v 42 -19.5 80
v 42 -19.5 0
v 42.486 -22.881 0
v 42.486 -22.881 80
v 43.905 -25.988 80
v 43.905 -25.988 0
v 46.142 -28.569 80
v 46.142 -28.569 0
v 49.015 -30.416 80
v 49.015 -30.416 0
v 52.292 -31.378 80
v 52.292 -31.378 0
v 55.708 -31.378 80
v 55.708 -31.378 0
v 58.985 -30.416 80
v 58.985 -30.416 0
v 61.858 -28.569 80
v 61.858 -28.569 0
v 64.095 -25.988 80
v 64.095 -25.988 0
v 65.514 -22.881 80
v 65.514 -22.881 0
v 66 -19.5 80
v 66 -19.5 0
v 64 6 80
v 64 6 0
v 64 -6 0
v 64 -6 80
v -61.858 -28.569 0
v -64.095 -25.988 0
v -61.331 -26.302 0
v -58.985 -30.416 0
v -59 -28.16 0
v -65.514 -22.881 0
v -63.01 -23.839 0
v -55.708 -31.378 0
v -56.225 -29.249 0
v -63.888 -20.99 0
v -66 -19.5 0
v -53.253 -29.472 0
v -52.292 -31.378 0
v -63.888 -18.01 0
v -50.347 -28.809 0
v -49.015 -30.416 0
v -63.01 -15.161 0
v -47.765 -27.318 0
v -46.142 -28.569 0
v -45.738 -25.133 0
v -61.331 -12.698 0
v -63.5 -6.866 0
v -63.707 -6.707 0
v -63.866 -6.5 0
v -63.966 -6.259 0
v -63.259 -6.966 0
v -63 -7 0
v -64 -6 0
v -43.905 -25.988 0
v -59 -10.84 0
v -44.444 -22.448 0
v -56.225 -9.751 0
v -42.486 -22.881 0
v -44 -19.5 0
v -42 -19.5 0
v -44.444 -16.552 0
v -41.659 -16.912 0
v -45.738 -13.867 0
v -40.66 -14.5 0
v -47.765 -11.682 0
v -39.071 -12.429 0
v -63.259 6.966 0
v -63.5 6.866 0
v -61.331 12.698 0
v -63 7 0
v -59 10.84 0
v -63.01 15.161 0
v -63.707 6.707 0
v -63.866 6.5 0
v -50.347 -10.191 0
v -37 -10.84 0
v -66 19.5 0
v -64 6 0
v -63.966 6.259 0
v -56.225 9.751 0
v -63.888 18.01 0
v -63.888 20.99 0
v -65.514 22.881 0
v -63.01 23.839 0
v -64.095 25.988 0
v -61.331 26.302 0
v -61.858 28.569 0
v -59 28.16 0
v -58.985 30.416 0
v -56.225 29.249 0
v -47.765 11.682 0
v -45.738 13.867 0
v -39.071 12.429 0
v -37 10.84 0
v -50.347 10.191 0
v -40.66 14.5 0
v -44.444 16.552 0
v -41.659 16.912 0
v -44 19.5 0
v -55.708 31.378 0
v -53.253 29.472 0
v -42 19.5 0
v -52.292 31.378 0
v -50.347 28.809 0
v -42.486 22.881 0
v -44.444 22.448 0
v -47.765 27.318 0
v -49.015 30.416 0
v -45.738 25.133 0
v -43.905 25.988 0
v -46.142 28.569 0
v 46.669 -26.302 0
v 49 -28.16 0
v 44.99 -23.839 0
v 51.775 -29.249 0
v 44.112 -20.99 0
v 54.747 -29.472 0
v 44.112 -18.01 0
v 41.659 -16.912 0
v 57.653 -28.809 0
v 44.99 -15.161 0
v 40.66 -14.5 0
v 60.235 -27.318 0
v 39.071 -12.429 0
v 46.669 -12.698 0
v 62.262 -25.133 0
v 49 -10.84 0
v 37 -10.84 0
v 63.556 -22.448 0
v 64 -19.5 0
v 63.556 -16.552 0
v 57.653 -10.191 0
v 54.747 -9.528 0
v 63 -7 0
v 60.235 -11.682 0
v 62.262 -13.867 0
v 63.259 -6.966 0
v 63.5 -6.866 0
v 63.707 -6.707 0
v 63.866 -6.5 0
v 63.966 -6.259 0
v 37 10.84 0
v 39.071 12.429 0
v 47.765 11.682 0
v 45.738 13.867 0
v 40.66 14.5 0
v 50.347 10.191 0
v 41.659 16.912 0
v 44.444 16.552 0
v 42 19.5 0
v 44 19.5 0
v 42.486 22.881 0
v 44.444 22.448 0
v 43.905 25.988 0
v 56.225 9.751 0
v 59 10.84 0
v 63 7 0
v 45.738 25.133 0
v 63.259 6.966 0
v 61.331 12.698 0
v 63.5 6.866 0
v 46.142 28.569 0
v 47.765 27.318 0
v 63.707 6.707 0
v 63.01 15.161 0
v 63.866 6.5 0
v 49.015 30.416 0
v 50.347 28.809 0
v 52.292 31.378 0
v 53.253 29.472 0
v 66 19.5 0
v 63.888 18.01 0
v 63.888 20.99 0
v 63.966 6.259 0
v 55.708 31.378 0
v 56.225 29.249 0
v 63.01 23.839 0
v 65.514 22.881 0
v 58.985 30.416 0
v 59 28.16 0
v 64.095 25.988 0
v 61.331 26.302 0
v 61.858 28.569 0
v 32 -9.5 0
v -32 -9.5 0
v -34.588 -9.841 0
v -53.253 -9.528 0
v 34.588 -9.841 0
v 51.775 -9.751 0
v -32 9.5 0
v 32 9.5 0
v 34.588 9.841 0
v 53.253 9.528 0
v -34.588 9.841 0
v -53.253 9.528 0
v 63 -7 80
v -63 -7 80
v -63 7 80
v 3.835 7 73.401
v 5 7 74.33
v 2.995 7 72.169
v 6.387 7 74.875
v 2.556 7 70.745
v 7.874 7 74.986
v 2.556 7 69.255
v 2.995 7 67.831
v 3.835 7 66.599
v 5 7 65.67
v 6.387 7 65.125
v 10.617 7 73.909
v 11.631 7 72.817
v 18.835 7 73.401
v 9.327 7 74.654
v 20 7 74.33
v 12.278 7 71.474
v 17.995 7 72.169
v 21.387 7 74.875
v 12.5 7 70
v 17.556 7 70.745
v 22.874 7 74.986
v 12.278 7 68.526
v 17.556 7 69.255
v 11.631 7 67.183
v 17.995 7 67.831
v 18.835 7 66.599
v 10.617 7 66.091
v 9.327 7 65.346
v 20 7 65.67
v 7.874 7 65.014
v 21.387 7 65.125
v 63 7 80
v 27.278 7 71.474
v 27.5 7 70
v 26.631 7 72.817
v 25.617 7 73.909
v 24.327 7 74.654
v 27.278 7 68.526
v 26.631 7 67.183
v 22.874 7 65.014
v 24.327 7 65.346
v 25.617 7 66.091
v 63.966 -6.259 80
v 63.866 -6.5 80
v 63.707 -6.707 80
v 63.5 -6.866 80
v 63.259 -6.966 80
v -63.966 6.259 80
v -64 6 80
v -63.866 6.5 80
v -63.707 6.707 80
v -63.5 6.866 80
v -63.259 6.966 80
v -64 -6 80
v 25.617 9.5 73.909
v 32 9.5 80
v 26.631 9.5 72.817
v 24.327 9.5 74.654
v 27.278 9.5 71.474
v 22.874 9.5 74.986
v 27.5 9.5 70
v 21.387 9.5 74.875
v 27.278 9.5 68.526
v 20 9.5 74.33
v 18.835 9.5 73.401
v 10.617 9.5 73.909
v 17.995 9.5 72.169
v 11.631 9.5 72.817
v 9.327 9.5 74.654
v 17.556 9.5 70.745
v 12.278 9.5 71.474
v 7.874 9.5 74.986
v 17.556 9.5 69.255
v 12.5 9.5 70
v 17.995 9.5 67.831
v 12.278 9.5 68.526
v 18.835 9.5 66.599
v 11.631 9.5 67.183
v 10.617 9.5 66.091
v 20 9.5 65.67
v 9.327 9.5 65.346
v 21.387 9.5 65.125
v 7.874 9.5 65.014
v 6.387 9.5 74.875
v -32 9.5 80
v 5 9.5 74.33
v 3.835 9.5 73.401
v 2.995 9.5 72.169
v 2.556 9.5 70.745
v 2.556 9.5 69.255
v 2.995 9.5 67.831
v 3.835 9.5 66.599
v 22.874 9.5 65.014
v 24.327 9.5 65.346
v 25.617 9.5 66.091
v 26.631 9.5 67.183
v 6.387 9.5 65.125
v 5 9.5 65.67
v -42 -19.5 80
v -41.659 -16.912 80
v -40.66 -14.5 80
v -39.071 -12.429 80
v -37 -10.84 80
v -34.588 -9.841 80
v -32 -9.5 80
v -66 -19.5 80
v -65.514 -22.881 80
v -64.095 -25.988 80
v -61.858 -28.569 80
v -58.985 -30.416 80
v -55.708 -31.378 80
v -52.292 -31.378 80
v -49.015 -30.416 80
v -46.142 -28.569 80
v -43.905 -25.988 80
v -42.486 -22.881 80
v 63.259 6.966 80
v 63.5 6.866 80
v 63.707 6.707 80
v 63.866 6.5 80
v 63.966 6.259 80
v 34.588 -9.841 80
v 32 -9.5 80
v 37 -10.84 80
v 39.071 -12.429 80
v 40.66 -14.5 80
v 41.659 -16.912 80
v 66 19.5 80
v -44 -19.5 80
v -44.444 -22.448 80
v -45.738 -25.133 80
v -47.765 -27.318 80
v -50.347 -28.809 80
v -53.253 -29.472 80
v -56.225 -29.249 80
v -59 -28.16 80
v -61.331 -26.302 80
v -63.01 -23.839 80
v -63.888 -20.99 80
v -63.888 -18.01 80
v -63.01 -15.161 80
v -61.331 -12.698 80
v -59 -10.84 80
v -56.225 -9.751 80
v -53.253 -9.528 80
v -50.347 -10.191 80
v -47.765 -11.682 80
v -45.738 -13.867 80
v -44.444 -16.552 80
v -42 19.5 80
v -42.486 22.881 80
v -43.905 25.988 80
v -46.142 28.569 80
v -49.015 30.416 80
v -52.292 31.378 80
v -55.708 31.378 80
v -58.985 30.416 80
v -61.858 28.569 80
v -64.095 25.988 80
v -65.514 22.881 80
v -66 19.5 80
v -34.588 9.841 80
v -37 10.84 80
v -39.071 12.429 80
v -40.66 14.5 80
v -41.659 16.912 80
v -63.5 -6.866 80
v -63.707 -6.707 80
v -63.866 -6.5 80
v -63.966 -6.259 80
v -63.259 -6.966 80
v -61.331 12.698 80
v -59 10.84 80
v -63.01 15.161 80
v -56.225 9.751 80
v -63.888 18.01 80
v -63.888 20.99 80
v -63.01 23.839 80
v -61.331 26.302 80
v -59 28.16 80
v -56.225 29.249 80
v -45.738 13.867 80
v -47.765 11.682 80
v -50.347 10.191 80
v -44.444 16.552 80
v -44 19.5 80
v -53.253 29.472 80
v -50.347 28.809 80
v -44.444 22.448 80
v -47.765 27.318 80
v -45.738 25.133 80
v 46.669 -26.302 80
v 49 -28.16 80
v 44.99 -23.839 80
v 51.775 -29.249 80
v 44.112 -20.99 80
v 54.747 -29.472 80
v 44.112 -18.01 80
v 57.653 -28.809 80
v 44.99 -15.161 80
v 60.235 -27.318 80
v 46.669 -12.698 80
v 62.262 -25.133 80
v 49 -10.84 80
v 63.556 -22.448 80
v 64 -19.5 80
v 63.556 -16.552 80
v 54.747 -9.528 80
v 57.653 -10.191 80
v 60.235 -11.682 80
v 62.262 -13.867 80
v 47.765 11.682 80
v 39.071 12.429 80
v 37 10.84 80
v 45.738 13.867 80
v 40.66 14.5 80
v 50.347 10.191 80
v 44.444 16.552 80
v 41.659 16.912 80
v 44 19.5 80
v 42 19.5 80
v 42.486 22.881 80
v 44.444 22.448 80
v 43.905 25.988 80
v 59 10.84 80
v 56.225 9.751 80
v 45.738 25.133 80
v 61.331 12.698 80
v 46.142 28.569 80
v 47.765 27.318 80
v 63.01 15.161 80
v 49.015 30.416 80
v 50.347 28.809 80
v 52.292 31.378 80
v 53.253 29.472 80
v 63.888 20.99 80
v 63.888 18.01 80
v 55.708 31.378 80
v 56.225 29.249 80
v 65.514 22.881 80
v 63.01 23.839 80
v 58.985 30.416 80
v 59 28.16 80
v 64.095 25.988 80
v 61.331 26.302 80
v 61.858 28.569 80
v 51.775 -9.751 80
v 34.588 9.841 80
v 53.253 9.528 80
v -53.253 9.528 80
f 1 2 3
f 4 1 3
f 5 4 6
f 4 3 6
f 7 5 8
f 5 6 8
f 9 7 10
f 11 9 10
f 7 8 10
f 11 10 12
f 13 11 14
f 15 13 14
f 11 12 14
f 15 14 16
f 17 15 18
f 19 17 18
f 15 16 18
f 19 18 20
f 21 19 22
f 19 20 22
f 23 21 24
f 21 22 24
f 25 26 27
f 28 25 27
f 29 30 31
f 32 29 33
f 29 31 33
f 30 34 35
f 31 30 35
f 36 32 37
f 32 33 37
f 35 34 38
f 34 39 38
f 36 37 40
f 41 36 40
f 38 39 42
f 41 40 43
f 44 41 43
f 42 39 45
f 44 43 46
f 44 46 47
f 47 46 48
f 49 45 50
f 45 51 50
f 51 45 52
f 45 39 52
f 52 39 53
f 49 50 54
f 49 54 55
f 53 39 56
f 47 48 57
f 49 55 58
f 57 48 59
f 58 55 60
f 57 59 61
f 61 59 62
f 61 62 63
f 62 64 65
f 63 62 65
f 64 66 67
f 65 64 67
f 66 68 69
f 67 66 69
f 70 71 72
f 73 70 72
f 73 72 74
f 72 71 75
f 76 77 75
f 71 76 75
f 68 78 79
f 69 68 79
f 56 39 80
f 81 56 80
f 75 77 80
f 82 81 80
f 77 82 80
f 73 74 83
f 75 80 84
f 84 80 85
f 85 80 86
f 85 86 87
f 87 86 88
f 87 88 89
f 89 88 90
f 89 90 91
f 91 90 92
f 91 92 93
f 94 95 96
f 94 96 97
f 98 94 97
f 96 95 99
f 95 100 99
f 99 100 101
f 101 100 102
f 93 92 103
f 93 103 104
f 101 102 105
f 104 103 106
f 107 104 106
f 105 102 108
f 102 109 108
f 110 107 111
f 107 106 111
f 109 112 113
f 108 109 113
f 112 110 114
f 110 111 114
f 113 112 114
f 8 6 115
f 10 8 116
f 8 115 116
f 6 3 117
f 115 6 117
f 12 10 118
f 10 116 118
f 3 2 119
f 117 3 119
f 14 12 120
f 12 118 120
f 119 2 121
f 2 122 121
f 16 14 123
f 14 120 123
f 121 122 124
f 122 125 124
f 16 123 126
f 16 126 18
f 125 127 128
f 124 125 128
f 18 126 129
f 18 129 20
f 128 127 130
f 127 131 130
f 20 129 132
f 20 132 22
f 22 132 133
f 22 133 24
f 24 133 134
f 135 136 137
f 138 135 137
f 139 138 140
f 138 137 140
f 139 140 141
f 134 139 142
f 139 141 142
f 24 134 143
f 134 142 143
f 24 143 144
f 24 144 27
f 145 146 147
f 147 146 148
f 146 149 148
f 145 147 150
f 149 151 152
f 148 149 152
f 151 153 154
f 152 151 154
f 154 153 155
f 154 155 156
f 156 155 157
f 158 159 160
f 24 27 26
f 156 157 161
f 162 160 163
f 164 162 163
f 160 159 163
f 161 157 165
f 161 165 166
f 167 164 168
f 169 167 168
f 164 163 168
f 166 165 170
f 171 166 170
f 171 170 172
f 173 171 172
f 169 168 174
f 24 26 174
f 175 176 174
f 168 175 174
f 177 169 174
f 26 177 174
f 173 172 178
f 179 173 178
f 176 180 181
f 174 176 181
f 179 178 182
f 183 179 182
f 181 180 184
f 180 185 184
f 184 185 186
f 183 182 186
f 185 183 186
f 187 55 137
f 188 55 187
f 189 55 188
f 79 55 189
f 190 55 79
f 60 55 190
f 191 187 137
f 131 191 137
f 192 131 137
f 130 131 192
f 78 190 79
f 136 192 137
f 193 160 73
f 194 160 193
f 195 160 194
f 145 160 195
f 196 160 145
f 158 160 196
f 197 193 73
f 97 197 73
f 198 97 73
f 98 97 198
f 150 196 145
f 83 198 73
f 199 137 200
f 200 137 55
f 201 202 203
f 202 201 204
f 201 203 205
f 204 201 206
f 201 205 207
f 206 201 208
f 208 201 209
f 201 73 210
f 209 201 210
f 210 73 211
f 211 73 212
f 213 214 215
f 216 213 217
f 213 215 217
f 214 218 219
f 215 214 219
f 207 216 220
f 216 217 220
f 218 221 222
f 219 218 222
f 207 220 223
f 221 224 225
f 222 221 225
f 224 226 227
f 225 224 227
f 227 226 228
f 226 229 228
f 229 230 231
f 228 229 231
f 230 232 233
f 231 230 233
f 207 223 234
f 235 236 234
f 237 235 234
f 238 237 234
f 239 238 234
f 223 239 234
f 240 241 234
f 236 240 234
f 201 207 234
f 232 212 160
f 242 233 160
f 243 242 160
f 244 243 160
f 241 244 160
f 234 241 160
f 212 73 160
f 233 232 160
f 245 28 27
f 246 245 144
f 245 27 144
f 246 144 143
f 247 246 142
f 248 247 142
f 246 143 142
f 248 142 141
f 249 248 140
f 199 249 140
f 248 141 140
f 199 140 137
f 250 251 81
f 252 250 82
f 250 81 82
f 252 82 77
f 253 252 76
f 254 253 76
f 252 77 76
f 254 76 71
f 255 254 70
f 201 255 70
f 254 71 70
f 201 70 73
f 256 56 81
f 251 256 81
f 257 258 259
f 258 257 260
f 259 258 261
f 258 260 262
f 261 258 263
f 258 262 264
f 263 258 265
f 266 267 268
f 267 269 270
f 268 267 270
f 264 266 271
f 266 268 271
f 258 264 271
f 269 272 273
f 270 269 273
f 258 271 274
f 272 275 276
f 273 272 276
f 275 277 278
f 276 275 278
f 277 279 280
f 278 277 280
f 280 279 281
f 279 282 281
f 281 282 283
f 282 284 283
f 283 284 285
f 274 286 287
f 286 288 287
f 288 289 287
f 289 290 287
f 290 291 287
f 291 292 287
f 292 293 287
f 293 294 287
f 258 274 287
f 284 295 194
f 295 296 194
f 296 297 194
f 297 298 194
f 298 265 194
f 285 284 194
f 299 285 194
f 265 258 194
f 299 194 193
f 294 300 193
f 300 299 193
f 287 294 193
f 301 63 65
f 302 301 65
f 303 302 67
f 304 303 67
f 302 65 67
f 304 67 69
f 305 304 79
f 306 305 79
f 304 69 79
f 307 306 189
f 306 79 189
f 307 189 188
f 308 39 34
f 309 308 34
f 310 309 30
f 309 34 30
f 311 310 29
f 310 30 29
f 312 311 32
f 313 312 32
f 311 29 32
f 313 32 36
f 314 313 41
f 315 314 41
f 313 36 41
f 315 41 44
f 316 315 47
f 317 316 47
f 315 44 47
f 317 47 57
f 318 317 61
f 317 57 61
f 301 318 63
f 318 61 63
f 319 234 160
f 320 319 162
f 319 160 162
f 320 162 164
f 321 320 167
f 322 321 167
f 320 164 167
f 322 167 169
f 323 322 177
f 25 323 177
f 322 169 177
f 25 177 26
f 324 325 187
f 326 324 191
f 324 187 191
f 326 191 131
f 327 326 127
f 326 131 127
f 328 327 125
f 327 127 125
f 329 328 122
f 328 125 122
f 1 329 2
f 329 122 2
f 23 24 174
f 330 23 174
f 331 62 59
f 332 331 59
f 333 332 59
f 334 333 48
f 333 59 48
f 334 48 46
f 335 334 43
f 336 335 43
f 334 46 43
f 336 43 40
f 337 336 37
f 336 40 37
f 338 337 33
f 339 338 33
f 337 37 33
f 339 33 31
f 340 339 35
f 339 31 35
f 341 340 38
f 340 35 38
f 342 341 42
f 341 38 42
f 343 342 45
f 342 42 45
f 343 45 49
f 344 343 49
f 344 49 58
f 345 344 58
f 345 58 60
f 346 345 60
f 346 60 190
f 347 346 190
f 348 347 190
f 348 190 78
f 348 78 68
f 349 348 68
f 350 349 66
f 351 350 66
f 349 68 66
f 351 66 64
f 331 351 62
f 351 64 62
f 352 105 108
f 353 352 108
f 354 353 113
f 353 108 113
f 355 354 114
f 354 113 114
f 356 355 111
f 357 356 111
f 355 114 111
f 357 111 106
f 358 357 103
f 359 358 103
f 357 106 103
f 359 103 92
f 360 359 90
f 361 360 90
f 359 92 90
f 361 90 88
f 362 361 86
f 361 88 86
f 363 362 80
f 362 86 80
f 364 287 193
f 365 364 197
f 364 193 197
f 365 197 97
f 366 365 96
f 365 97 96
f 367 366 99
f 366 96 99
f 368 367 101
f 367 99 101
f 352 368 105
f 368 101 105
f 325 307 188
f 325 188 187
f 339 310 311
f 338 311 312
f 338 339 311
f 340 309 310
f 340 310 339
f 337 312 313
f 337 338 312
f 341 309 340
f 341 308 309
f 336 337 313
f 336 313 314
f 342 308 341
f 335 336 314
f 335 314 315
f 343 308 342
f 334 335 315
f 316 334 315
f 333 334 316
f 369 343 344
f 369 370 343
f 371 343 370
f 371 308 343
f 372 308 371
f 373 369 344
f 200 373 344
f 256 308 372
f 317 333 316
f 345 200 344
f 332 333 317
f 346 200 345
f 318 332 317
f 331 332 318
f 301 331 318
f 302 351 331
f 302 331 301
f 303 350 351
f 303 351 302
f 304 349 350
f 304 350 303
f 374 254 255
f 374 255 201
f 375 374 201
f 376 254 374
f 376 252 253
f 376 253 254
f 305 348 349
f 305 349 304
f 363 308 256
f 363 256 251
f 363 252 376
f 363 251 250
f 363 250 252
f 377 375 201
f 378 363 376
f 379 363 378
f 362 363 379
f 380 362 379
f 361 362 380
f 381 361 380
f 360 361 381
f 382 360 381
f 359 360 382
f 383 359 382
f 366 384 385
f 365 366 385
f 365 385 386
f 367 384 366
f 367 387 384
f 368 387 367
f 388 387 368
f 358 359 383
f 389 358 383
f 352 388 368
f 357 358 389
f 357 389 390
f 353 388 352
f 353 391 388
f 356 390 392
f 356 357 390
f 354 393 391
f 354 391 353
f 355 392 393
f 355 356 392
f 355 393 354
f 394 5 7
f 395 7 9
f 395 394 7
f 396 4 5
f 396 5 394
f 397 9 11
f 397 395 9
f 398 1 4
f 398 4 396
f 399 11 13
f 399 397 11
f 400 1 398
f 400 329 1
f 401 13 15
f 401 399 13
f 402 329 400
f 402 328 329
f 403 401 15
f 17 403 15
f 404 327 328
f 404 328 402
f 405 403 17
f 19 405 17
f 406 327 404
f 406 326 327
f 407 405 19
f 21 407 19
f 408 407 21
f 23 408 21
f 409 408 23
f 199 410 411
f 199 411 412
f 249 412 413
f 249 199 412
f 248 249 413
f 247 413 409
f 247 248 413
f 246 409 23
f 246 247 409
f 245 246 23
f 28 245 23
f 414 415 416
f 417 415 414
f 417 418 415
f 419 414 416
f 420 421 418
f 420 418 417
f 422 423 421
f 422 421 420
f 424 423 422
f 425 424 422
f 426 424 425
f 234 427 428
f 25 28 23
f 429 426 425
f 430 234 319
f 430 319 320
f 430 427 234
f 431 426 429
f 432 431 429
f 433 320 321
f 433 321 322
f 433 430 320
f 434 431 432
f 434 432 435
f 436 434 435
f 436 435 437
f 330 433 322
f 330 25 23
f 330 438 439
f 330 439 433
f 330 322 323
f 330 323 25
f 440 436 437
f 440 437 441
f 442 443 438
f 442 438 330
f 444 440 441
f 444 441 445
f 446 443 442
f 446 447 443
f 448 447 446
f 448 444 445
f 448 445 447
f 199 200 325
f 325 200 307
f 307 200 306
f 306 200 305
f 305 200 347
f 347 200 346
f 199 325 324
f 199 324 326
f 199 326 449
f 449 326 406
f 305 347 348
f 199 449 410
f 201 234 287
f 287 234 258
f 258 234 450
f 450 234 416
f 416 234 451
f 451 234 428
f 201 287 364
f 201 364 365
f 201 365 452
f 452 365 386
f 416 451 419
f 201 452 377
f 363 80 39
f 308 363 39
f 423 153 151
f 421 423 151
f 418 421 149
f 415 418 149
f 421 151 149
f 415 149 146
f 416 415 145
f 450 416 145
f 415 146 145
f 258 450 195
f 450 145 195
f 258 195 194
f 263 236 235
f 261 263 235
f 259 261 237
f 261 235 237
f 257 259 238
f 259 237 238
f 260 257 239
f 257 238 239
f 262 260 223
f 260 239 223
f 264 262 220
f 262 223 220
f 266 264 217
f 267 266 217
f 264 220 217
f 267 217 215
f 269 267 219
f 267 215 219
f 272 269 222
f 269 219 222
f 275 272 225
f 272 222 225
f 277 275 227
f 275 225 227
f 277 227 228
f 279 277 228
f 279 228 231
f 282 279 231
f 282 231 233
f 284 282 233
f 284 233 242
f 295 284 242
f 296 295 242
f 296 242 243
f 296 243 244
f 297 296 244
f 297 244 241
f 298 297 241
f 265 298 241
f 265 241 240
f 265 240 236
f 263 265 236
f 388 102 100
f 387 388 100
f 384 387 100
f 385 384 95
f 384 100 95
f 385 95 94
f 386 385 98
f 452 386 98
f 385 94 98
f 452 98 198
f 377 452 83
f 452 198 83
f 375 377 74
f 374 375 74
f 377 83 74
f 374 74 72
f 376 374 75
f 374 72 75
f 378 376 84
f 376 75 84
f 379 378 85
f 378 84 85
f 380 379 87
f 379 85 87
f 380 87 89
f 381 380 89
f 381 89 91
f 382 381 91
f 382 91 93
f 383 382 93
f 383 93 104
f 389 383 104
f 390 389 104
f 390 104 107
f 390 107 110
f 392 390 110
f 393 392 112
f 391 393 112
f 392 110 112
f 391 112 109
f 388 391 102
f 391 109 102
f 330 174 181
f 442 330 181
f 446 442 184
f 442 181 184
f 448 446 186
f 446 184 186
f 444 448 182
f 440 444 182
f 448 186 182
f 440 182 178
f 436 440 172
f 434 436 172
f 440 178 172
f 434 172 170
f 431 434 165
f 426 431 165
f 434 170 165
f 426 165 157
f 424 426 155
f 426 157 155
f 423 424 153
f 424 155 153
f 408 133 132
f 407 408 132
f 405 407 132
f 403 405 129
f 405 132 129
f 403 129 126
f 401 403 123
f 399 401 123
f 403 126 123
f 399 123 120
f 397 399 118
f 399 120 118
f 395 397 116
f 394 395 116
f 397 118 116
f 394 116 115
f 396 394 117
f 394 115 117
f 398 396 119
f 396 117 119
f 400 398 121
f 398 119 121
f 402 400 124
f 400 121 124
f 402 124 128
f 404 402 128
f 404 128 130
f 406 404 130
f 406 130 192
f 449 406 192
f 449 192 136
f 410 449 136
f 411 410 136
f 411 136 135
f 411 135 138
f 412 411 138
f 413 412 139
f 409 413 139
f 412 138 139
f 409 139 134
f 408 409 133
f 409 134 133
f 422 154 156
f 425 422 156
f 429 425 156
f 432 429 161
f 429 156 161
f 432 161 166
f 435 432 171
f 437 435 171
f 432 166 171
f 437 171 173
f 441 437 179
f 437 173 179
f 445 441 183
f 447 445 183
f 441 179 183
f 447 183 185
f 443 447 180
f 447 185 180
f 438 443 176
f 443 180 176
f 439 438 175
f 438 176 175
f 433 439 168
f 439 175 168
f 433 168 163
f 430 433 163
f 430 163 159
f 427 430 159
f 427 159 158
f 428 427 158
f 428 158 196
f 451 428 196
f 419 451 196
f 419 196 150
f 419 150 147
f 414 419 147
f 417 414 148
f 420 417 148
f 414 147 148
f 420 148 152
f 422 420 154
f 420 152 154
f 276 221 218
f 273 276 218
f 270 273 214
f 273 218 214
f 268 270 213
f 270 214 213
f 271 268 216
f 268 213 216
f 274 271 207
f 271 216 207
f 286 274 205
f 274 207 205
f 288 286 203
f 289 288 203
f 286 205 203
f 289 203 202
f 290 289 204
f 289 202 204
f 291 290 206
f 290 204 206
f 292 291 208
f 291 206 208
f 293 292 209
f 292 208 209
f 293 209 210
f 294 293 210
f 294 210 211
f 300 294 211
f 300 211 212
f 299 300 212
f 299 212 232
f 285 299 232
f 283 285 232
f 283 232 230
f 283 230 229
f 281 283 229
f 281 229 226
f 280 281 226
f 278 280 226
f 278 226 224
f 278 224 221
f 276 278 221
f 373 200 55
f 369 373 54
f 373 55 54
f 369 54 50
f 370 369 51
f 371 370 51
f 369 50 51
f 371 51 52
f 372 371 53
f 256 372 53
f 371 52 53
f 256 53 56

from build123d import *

# Parameters (mm, degrees)
F1_DEPTH = 80
F2_R     = 5
F3_DEPTH = 25


with BuildPart() as f1:
    # F0 (on Top) → F1 (new body)
    with BuildSketch(Plane.XY):
        with BuildLine():
            Line((44, 7), (63, 7))
            ThreePointArc((63, 7), (63.707107, 6.707107), (64, 6))
            Line((64, 6), (64, -6))
            ThreePointArc((64, -6), (63.707107, -6.707107), (63, -7))
            Line((63, -7), (44, -7))
            Line((44, -7), (44, -19.5))
            ThreePointArc((44, -19.5), (54, -9.5), (64, -19.5))
            Line((64, -19.5), (64, -7))
            Line((64, -7), (66, -7))
            Line((66, -7), (66, 7))
            Line((66, 7), (64, 7))
            Line((64, 7), (64, 19.5))
            ThreePointArc((64, 19.5), (54, 9.5), (44, 19.5))
            Line((44, 19.5), (44, 7))
        make_face()
        with BuildLine():
            Line((42, 7), (44, 7))
            Line((44, 7), (44, 19.5))
            ThreePointArc((44, 19.5), (54, 29.5), (64, 19.5))
            Line((64, 19.5), (64, 7))
            Line((64, 7), (66, 7))
            Line((66, 7), (66, 19.5))
            ThreePointArc((66, 19.5), (54, 31.5), (42, 19.5))
            Line((42, 19.5), (42, 7))
        make_face()
        with BuildLine():
            Line((-42, 7), (42, 7))
            Line((42, 7), (42, 19.5))
            ThreePointArc((42, 19.5), (39.071068, 12.428932), (32, 9.5))
            Line((32, 9.5), (-32, 9.5))
            ThreePointArc((-32, 9.5), (-39.071068, 12.428932), (-42, 19.5))
            Line((-42, 19.5), (-42, 7))
        make_face()
        with BuildLine():
            Line((-44, 7), (-42, 7))
            Line((-42, 7), (-42, 19.5))
            ThreePointArc((-42, 19.5), (-54, 31.5), (-66, 19.5))
            Line((-66, 19.5), (-66, 7))
            Line((-66, 7), (-64, 7))
            Line((-64, 7), (-64, 19.5))
            ThreePointArc((-64, 19.5), (-54, 29.5), (-44, 19.5))
            Line((-44, 19.5), (-44, 7))
        make_face()
        with BuildLine():
            Line((-63, 7), (-44, 7))
            Line((-44, 7), (-44, 19.5))
            ThreePointArc((-44, 19.5), (-54, 9.5), (-64, 19.5))
            Line((-64, 19.5), (-64, 7))
            Line((-64, 7), (-66, 7))
            Line((-66, 7), (-66, -6.902831))
            Line((-66, -6.902831), (-64, -7))
            Line((-64, -7), (-64, -19.5))
            ThreePointArc((-64, -19.5), (-54, -9.5), (-44, -19.5))
            Line((-44, -19.5), (-44, -7))
            Line((-44, -7), (-63, -7))
            ThreePointArc((-63, -7), (-63.707107, -6.707107), (-64, -6))
            Line((-64, -6), (-64, 6))
            ThreePointArc((-64, 6), (-63.707107, 6.707107), (-63, 7))
        make_face()
        with BuildLine():
            Line((44, -19.5), (44, -7))
            Line((44, -7), (42, -7))
            Line((42, -7), (42, -19.5))
            ThreePointArc((42, -19.5), (54, -31.5), (66, -19.5))
            Line((66, -19.5), (66, -7))
            Line((66, -7), (64, -7))
            Line((64, -7), (64, -19.5))
            ThreePointArc((64, -19.5), (54, -29.5), (44, -19.5))
        make_face()
        with BuildLine():
            Line((42, -19.5), (42, -7))
            Line((42, -7), (-42, -7))
            Line((-42, -7), (-42, -19.5))
            ThreePointArc((-42, -19.5), (-39.071068, -12.428932), (-32, -9.5))
            Line((-32, -9.5), (32, -9.5))
            ThreePointArc((32, -9.5), (39.071068, -12.428932), (42, -19.5))
        make_face()
        with BuildLine():
            Line((-42, -19.5), (-42, -7))
            Line((-42, -7), (-44, -7))
            Line((-44, -7), (-44, -19.5))
            ThreePointArc((-44, -19.5), (-54, -29.5), (-64, -19.5))
            Line((-64, -19.5), (-64, -7))
            Line((-64, -7), (-66, -6.902831))
            Line((-66, -6.902831), (-66, -19.5))
            ThreePointArc((-66, -19.5), (-54, -31.5), (-42, -19.5))
        make_face()
    extrude(amount=F1_DEPTH)

    # F2 (on Front) → F3 (cut)
    with BuildSketch(Plane.XZ):
        with Locations((22.5, 70)):
            Circle(F2_R)
        with Locations((7.5, 70)):
            Circle(F2_R)
    extrude(amount=-F3_DEPTH, mode=Mode.SUBTRACT)


solid = f1.part
